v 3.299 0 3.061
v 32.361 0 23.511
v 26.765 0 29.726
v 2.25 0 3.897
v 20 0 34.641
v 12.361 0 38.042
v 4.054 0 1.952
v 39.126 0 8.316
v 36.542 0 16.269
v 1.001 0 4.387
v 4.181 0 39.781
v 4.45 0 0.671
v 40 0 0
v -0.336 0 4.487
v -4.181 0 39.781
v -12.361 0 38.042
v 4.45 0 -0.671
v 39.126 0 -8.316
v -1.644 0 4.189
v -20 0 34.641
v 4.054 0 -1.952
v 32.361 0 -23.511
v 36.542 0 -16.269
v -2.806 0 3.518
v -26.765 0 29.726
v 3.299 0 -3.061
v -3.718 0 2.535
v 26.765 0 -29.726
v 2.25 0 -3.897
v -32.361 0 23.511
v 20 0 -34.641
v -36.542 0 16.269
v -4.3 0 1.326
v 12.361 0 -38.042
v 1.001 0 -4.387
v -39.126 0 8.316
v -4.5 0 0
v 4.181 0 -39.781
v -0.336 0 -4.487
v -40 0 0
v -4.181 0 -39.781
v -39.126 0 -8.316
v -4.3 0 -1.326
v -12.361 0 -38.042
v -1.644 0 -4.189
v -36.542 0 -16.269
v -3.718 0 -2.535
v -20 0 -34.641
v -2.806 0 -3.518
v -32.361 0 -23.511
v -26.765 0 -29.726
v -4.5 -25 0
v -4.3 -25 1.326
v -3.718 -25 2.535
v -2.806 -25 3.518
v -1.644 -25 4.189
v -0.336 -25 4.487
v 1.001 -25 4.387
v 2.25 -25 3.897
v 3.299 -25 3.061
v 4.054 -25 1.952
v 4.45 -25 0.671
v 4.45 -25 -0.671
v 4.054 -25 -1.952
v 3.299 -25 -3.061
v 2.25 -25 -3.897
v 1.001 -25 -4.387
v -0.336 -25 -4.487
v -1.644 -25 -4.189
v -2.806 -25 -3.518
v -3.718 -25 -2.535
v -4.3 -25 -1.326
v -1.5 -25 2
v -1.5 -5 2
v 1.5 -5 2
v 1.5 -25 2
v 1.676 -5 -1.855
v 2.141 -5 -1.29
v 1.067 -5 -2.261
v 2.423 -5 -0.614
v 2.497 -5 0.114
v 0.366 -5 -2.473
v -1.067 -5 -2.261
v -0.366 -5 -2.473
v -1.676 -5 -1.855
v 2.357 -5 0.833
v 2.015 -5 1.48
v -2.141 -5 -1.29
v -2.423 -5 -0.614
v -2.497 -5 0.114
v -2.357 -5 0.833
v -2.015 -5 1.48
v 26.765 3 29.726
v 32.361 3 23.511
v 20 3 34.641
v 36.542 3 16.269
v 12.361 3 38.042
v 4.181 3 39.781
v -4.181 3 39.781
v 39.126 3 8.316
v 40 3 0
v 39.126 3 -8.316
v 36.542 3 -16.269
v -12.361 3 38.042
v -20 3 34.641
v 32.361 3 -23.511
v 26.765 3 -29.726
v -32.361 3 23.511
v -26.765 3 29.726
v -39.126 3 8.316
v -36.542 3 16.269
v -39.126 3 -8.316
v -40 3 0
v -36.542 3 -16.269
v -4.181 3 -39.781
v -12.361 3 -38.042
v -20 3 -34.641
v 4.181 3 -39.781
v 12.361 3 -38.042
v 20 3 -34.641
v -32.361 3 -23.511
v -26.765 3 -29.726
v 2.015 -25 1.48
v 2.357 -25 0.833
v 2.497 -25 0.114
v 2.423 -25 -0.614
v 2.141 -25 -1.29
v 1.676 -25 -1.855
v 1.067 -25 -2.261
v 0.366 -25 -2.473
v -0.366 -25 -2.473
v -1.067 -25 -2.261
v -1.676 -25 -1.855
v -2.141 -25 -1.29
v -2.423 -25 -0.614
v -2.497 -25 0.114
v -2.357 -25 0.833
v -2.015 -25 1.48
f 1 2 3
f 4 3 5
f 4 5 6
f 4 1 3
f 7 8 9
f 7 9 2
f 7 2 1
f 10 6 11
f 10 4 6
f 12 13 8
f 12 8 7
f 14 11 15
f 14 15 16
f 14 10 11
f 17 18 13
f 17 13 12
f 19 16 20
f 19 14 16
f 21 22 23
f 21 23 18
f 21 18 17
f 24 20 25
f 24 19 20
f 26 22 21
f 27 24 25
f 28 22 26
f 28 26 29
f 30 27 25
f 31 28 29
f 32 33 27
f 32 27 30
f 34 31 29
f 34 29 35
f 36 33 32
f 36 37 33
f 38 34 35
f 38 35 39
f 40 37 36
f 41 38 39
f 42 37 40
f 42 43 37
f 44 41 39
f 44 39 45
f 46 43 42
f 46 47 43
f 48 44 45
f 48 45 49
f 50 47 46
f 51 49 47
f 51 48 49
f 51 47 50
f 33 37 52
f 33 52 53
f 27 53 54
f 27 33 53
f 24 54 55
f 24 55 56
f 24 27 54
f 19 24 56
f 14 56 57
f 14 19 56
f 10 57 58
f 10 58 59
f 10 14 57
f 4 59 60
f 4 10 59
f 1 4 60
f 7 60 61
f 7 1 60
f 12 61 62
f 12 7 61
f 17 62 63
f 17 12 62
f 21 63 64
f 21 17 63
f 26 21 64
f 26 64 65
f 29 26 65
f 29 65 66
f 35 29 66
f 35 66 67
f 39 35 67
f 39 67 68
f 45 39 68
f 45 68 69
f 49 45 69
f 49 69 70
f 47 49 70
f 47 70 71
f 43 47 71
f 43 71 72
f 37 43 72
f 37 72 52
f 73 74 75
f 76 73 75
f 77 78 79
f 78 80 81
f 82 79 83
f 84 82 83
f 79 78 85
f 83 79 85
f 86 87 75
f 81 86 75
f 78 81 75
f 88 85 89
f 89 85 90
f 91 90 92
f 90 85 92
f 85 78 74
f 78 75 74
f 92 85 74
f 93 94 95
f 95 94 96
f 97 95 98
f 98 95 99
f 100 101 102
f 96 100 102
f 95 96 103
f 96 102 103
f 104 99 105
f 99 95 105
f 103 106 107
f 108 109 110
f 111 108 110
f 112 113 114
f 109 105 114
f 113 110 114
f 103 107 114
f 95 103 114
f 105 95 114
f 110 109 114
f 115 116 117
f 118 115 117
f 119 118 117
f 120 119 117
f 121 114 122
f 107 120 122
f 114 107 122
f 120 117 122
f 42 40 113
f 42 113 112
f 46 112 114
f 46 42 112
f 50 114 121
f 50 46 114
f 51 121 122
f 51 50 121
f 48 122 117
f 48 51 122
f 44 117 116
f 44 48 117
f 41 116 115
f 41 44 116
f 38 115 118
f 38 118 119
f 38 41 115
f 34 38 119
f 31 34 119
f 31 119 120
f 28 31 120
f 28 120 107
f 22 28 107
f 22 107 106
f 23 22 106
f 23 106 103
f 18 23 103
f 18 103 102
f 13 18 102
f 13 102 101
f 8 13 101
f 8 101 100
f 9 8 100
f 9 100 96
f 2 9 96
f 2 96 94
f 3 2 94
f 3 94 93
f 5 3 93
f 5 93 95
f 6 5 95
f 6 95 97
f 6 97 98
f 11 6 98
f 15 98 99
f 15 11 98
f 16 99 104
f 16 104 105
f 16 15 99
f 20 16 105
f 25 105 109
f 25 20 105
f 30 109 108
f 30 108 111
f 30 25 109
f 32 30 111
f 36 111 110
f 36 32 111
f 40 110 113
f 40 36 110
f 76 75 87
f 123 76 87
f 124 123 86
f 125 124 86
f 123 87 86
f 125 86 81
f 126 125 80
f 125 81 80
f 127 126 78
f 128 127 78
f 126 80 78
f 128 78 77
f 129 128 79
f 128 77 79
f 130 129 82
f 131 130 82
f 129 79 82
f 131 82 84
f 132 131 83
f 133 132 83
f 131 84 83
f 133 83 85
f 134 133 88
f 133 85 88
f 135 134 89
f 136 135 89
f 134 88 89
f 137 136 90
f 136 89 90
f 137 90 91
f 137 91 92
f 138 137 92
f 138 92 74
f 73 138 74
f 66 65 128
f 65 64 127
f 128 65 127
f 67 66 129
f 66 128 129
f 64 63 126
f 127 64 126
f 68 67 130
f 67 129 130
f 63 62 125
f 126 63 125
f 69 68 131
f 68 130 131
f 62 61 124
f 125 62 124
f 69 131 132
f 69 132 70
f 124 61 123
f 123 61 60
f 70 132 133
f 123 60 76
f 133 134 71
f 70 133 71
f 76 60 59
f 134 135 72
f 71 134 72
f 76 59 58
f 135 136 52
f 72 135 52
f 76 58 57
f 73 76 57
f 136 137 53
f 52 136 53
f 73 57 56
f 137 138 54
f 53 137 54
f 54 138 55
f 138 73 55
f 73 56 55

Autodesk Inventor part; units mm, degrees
ref_plane "YZ Plane" through (0, 0, 0) normal (1, 0, 0) x (0, 1, 0)
ref_plane "XZ Plane" through (0, 0, 0) normal (0, 1, 0) x (-1, 0, 0)
ref_plane "XY Plane" through (0, 0, 0) normal (0, 0, 1) x (1, 0, 0)
sketch "Sketch1" plane through (0, 0, 0) normal (0, 1, 0) x (-1, 0, 0)
  circle A0 centre (0, 0) radius 4.5
  arc A1 (-1.5, 2) -> (1.5, 2) centre (0, 0) ccw
  line L0 (1.5, 2) -> (-1.5, 2)
  arc A2 (1.5, 2) -> (-1.5, 2) centre (0, 0) ccw construction
  dimension "d0" = 5
  dimension "d1" = 9
  dimension "d4" = 3
extrude "Extrusion1" add sketch "Sketch1" against normal blind 25
sketch "Sketch2" plane through (0, 0, 0) normal (0, -1, 0) x (-1, 0, 0)
  circle A0 centre (0, 0) radius 40
  dimension "d5" = 80
extrude "Extrusion2" add sketch "Sketch2" against normal blind 3
extrude "Extrusion3" add sketch "Sketch1" against normal blind 5 contours L0 A1
properties part number "Soporte_mesa"
